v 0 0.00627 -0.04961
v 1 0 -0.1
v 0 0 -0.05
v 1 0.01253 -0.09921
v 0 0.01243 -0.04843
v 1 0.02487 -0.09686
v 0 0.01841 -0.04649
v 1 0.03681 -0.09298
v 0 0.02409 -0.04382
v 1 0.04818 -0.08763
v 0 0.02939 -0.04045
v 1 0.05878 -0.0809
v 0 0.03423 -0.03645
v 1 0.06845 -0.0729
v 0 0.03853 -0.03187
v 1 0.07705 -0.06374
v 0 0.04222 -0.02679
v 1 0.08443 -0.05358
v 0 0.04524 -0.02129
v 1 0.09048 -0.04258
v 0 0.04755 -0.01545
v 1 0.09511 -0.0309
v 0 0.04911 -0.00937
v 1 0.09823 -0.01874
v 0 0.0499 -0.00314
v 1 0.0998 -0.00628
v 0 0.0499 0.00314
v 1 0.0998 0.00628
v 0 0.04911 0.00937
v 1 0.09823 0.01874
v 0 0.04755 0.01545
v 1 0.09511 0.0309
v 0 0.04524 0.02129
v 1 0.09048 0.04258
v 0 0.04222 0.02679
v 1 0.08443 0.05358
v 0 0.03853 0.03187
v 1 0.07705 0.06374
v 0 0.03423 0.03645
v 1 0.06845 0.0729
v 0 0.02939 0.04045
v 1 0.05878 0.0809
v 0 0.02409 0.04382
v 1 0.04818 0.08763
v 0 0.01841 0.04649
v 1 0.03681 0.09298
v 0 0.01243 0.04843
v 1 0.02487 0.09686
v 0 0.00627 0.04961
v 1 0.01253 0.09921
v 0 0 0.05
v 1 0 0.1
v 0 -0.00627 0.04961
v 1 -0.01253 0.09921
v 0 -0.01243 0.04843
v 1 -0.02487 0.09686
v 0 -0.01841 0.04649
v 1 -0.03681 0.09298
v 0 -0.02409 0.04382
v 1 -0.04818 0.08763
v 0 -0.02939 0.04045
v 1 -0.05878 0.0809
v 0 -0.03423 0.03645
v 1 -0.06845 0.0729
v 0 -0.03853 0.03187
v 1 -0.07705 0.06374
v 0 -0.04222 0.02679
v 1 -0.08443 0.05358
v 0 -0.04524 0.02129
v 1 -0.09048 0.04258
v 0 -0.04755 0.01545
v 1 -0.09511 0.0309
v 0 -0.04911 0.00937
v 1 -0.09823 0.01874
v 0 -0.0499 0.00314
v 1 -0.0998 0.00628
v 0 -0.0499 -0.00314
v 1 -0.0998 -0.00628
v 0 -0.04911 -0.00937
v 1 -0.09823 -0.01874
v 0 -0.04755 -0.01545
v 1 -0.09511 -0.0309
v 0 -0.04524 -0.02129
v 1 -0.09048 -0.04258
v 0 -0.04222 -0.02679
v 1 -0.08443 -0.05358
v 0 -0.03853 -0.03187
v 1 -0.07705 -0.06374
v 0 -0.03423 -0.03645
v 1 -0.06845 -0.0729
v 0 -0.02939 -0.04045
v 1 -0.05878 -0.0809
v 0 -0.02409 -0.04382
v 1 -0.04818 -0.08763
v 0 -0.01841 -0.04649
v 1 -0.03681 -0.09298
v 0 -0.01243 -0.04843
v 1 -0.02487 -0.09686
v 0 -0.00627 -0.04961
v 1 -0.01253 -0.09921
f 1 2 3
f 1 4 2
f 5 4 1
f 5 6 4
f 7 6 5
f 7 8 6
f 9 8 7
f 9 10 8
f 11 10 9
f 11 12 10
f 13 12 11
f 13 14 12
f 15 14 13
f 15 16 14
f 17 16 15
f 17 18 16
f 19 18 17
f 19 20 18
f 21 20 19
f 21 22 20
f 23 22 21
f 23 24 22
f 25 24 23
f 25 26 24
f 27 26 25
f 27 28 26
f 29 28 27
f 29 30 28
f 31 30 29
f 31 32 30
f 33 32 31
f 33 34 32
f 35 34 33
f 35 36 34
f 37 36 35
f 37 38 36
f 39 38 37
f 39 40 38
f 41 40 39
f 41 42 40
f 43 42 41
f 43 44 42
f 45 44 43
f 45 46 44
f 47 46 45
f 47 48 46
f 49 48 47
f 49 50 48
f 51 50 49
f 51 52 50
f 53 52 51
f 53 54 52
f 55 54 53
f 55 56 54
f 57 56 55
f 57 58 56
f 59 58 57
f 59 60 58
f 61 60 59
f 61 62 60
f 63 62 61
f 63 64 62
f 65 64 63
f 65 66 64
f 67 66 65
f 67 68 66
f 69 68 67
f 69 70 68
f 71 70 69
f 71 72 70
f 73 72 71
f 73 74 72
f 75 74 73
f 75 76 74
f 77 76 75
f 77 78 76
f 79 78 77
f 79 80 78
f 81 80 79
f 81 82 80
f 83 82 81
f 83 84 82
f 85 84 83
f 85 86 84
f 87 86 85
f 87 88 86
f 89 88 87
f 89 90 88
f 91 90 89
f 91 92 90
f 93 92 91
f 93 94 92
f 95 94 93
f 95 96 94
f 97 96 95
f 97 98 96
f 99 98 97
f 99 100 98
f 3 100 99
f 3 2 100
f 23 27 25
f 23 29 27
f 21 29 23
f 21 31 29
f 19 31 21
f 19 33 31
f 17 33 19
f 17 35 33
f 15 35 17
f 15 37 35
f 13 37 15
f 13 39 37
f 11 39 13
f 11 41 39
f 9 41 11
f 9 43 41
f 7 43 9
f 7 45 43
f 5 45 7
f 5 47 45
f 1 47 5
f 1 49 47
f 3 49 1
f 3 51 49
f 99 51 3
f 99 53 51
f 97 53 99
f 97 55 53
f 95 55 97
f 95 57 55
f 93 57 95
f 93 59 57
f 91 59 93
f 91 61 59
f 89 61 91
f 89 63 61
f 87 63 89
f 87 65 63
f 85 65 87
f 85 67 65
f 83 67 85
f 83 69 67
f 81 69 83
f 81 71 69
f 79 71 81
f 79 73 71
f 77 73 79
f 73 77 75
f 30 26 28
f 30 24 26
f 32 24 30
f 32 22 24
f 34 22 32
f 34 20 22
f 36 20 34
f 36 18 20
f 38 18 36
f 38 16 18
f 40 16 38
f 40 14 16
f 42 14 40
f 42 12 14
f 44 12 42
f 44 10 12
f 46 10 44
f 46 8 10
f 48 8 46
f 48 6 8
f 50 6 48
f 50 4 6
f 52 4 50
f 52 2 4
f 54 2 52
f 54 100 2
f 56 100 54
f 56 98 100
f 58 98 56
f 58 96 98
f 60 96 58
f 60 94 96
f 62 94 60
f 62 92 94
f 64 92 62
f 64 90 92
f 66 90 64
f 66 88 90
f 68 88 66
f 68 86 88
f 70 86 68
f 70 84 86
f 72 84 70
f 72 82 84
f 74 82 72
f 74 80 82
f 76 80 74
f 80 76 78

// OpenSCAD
$fn=50;  // REMOVE
LENGTH = 1;  // REMOVE
DO = 0.1; // REMOVE
PARAM1 = 0.2; // REMOVE
rotate([0, 90, 0])
translate([0, 0, (LENGTH)/2])
cylinder(h = (LENGTH), r1 = (DO)/2, r2 = (PARAM1)/2, center = true);
